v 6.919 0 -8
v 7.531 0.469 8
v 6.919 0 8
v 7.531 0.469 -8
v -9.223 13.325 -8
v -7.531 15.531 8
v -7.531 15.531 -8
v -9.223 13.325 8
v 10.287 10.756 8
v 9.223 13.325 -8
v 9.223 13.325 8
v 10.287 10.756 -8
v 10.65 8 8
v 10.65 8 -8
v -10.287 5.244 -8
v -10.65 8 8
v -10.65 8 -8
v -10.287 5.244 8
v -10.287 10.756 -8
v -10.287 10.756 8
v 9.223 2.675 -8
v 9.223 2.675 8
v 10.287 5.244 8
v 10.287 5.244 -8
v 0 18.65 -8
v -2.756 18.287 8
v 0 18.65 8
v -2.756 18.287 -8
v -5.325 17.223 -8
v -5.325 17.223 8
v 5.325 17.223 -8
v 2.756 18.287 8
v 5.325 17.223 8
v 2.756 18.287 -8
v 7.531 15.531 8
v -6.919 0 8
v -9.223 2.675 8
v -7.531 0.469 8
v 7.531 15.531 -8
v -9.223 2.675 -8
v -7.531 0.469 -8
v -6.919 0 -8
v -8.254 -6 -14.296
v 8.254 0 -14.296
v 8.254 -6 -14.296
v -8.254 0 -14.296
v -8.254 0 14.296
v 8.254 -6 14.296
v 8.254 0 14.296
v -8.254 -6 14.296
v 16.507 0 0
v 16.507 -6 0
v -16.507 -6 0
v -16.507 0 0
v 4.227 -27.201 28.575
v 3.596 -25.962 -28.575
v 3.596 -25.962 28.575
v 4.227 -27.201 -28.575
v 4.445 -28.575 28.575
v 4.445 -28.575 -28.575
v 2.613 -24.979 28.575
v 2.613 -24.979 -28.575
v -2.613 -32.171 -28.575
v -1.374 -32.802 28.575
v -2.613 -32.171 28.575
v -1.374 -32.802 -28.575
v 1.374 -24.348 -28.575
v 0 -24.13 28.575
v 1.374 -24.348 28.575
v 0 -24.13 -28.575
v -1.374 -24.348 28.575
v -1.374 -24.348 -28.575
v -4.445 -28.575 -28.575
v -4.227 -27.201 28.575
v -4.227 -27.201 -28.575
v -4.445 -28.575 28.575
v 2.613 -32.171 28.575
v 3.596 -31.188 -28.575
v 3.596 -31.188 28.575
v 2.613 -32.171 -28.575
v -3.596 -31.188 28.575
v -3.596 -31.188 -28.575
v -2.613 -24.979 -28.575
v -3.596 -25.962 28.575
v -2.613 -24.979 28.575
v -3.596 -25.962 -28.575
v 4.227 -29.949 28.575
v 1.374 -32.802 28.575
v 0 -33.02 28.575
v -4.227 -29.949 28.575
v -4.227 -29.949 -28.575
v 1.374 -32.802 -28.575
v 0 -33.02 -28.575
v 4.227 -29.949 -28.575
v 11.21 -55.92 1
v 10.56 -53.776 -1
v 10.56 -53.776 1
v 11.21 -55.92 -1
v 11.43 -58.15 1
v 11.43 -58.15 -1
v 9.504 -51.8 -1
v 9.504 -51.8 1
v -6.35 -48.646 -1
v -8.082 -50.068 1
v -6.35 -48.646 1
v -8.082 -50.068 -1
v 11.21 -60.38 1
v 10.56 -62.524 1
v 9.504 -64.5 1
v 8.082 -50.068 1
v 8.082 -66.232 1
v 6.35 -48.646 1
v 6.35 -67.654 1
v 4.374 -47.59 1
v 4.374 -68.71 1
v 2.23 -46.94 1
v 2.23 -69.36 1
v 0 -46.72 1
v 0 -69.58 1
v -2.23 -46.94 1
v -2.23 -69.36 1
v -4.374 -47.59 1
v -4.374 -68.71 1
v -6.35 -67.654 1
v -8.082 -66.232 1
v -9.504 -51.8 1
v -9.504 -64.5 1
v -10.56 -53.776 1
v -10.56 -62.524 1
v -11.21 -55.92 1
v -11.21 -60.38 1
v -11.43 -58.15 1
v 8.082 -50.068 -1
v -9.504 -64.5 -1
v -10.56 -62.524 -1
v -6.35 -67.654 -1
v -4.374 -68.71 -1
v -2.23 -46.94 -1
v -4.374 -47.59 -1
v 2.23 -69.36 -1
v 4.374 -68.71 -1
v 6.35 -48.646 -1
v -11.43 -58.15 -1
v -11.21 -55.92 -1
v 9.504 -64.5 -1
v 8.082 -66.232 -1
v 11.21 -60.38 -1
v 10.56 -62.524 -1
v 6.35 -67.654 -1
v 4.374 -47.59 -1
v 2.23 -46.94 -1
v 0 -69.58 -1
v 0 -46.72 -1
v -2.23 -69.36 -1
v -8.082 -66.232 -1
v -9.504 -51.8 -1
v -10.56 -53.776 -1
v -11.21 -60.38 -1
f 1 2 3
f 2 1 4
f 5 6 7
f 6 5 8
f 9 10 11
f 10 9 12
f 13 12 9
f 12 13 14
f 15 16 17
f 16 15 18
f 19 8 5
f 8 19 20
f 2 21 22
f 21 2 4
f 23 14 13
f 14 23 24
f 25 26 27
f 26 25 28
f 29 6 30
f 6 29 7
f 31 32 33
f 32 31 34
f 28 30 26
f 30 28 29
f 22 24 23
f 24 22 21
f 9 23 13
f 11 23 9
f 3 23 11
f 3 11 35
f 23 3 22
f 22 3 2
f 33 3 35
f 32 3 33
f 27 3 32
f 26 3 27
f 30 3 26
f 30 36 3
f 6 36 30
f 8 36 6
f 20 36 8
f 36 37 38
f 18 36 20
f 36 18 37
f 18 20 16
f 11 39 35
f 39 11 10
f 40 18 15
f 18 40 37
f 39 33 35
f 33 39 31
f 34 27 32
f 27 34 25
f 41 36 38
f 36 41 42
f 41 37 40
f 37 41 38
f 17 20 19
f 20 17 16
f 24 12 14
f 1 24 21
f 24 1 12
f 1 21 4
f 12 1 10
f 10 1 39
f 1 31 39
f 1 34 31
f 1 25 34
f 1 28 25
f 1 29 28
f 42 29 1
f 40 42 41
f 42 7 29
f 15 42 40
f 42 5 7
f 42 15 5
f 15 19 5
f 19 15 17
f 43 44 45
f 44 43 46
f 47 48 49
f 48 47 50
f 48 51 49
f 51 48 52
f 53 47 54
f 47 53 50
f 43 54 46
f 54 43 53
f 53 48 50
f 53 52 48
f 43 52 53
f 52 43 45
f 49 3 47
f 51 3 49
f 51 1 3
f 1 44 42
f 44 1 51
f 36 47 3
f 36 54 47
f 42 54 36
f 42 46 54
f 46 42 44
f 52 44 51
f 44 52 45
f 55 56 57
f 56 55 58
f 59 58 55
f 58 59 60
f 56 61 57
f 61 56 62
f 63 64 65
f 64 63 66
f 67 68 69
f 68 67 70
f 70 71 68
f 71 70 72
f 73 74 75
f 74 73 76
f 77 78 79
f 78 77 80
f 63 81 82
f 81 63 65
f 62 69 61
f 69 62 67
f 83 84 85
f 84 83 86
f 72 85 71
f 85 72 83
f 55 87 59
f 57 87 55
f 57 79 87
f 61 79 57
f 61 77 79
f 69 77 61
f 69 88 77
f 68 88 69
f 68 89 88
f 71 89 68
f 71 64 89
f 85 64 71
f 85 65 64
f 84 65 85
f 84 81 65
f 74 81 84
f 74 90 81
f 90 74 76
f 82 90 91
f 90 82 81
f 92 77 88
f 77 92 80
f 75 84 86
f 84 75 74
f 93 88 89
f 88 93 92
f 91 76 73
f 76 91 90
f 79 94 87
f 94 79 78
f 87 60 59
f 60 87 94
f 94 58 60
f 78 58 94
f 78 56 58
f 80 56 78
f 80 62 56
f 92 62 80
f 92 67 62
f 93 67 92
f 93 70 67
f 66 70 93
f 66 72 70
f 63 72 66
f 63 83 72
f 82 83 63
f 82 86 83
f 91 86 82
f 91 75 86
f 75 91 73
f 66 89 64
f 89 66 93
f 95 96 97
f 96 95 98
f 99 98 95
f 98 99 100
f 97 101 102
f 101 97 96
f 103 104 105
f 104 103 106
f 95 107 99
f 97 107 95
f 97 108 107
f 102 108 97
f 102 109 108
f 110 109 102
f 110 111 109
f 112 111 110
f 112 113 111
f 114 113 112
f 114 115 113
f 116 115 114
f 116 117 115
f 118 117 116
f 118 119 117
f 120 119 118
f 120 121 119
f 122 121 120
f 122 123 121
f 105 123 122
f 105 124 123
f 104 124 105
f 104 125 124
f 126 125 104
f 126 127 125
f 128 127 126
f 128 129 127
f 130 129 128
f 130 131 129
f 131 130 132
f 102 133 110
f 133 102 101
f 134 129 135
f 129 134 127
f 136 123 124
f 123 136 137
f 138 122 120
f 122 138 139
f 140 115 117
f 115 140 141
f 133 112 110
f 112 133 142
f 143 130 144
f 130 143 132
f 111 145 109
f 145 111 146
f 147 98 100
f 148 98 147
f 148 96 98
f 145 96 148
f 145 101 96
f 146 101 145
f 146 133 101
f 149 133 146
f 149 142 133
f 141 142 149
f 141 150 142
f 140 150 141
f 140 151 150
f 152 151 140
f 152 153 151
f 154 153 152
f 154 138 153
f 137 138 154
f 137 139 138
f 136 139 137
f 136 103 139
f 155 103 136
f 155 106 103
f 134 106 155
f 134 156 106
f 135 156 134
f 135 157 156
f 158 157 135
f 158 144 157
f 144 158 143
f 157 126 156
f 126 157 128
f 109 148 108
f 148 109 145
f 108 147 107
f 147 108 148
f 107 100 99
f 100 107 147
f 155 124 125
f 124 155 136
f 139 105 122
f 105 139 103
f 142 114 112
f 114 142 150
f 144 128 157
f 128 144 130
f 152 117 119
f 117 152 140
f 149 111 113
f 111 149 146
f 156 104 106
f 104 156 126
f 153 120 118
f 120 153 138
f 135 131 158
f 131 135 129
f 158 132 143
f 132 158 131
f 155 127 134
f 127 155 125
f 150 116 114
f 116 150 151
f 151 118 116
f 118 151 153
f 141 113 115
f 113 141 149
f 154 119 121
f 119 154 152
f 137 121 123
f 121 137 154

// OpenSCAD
// Auto-generated by scripts/author_from_manifest.py (Phase D.3).
// Source: data/phase_d_manifest.json (sku_intent='tyco-ty4251-pendent-k80-200f').
// Do not hand-edit — regenerate from the manifest.
//
// @part tyco_ty4251_pendent_k80_200f
// @kind sprinkler_head
// @category head.pendant.k80
// @display-name "Tyco TY4251 Pendent K8.0 SR 200°F"
// @mfg tyco_fire_protection
// @mfg-pn TY4251
// @listing UL FM
// @hazard-classes OH1 OH2
// @price-usd 16.90
// @install-minutes 8
// @crew journeyman
// @k-factor 8
// @orientation pendant
// @response standard
// @temperature 200F
// @param size_in number default=0.5 label="Size" unit="in"
// @port inlet position=[0,0.014,0] direction=[0,1,0] style=NPT_threaded size_in=0.5 role=drop

size_in = 0.5;
k_factor = 8.0;

length_mm   = 57.15;
body_dia_mm = 25.40;
thread_od   = 21.3;
thread_len  = 16;
deflector_d = body_dia_mm * 0.9;

 union() {
    translate([0, thread_len/2, 0])
        cylinder(h = thread_len, d = thread_od, center = true, $fn = 24);
    translate([0, -3, 0])
        rotate([90, 0, 0])
        cylinder(h = 6, d = thread_od * 1.55, $fn = 6, center = true);
    translate([0, -length_mm/2, 0])
        cylinder(h = length_mm, d = body_dia_mm * 0.35, center = true, $fn = 20);
    translate([0, -length_mm - 1, 0])
        cylinder(h = 2, d = deflector_d, center = true, $fn = 32);
}
